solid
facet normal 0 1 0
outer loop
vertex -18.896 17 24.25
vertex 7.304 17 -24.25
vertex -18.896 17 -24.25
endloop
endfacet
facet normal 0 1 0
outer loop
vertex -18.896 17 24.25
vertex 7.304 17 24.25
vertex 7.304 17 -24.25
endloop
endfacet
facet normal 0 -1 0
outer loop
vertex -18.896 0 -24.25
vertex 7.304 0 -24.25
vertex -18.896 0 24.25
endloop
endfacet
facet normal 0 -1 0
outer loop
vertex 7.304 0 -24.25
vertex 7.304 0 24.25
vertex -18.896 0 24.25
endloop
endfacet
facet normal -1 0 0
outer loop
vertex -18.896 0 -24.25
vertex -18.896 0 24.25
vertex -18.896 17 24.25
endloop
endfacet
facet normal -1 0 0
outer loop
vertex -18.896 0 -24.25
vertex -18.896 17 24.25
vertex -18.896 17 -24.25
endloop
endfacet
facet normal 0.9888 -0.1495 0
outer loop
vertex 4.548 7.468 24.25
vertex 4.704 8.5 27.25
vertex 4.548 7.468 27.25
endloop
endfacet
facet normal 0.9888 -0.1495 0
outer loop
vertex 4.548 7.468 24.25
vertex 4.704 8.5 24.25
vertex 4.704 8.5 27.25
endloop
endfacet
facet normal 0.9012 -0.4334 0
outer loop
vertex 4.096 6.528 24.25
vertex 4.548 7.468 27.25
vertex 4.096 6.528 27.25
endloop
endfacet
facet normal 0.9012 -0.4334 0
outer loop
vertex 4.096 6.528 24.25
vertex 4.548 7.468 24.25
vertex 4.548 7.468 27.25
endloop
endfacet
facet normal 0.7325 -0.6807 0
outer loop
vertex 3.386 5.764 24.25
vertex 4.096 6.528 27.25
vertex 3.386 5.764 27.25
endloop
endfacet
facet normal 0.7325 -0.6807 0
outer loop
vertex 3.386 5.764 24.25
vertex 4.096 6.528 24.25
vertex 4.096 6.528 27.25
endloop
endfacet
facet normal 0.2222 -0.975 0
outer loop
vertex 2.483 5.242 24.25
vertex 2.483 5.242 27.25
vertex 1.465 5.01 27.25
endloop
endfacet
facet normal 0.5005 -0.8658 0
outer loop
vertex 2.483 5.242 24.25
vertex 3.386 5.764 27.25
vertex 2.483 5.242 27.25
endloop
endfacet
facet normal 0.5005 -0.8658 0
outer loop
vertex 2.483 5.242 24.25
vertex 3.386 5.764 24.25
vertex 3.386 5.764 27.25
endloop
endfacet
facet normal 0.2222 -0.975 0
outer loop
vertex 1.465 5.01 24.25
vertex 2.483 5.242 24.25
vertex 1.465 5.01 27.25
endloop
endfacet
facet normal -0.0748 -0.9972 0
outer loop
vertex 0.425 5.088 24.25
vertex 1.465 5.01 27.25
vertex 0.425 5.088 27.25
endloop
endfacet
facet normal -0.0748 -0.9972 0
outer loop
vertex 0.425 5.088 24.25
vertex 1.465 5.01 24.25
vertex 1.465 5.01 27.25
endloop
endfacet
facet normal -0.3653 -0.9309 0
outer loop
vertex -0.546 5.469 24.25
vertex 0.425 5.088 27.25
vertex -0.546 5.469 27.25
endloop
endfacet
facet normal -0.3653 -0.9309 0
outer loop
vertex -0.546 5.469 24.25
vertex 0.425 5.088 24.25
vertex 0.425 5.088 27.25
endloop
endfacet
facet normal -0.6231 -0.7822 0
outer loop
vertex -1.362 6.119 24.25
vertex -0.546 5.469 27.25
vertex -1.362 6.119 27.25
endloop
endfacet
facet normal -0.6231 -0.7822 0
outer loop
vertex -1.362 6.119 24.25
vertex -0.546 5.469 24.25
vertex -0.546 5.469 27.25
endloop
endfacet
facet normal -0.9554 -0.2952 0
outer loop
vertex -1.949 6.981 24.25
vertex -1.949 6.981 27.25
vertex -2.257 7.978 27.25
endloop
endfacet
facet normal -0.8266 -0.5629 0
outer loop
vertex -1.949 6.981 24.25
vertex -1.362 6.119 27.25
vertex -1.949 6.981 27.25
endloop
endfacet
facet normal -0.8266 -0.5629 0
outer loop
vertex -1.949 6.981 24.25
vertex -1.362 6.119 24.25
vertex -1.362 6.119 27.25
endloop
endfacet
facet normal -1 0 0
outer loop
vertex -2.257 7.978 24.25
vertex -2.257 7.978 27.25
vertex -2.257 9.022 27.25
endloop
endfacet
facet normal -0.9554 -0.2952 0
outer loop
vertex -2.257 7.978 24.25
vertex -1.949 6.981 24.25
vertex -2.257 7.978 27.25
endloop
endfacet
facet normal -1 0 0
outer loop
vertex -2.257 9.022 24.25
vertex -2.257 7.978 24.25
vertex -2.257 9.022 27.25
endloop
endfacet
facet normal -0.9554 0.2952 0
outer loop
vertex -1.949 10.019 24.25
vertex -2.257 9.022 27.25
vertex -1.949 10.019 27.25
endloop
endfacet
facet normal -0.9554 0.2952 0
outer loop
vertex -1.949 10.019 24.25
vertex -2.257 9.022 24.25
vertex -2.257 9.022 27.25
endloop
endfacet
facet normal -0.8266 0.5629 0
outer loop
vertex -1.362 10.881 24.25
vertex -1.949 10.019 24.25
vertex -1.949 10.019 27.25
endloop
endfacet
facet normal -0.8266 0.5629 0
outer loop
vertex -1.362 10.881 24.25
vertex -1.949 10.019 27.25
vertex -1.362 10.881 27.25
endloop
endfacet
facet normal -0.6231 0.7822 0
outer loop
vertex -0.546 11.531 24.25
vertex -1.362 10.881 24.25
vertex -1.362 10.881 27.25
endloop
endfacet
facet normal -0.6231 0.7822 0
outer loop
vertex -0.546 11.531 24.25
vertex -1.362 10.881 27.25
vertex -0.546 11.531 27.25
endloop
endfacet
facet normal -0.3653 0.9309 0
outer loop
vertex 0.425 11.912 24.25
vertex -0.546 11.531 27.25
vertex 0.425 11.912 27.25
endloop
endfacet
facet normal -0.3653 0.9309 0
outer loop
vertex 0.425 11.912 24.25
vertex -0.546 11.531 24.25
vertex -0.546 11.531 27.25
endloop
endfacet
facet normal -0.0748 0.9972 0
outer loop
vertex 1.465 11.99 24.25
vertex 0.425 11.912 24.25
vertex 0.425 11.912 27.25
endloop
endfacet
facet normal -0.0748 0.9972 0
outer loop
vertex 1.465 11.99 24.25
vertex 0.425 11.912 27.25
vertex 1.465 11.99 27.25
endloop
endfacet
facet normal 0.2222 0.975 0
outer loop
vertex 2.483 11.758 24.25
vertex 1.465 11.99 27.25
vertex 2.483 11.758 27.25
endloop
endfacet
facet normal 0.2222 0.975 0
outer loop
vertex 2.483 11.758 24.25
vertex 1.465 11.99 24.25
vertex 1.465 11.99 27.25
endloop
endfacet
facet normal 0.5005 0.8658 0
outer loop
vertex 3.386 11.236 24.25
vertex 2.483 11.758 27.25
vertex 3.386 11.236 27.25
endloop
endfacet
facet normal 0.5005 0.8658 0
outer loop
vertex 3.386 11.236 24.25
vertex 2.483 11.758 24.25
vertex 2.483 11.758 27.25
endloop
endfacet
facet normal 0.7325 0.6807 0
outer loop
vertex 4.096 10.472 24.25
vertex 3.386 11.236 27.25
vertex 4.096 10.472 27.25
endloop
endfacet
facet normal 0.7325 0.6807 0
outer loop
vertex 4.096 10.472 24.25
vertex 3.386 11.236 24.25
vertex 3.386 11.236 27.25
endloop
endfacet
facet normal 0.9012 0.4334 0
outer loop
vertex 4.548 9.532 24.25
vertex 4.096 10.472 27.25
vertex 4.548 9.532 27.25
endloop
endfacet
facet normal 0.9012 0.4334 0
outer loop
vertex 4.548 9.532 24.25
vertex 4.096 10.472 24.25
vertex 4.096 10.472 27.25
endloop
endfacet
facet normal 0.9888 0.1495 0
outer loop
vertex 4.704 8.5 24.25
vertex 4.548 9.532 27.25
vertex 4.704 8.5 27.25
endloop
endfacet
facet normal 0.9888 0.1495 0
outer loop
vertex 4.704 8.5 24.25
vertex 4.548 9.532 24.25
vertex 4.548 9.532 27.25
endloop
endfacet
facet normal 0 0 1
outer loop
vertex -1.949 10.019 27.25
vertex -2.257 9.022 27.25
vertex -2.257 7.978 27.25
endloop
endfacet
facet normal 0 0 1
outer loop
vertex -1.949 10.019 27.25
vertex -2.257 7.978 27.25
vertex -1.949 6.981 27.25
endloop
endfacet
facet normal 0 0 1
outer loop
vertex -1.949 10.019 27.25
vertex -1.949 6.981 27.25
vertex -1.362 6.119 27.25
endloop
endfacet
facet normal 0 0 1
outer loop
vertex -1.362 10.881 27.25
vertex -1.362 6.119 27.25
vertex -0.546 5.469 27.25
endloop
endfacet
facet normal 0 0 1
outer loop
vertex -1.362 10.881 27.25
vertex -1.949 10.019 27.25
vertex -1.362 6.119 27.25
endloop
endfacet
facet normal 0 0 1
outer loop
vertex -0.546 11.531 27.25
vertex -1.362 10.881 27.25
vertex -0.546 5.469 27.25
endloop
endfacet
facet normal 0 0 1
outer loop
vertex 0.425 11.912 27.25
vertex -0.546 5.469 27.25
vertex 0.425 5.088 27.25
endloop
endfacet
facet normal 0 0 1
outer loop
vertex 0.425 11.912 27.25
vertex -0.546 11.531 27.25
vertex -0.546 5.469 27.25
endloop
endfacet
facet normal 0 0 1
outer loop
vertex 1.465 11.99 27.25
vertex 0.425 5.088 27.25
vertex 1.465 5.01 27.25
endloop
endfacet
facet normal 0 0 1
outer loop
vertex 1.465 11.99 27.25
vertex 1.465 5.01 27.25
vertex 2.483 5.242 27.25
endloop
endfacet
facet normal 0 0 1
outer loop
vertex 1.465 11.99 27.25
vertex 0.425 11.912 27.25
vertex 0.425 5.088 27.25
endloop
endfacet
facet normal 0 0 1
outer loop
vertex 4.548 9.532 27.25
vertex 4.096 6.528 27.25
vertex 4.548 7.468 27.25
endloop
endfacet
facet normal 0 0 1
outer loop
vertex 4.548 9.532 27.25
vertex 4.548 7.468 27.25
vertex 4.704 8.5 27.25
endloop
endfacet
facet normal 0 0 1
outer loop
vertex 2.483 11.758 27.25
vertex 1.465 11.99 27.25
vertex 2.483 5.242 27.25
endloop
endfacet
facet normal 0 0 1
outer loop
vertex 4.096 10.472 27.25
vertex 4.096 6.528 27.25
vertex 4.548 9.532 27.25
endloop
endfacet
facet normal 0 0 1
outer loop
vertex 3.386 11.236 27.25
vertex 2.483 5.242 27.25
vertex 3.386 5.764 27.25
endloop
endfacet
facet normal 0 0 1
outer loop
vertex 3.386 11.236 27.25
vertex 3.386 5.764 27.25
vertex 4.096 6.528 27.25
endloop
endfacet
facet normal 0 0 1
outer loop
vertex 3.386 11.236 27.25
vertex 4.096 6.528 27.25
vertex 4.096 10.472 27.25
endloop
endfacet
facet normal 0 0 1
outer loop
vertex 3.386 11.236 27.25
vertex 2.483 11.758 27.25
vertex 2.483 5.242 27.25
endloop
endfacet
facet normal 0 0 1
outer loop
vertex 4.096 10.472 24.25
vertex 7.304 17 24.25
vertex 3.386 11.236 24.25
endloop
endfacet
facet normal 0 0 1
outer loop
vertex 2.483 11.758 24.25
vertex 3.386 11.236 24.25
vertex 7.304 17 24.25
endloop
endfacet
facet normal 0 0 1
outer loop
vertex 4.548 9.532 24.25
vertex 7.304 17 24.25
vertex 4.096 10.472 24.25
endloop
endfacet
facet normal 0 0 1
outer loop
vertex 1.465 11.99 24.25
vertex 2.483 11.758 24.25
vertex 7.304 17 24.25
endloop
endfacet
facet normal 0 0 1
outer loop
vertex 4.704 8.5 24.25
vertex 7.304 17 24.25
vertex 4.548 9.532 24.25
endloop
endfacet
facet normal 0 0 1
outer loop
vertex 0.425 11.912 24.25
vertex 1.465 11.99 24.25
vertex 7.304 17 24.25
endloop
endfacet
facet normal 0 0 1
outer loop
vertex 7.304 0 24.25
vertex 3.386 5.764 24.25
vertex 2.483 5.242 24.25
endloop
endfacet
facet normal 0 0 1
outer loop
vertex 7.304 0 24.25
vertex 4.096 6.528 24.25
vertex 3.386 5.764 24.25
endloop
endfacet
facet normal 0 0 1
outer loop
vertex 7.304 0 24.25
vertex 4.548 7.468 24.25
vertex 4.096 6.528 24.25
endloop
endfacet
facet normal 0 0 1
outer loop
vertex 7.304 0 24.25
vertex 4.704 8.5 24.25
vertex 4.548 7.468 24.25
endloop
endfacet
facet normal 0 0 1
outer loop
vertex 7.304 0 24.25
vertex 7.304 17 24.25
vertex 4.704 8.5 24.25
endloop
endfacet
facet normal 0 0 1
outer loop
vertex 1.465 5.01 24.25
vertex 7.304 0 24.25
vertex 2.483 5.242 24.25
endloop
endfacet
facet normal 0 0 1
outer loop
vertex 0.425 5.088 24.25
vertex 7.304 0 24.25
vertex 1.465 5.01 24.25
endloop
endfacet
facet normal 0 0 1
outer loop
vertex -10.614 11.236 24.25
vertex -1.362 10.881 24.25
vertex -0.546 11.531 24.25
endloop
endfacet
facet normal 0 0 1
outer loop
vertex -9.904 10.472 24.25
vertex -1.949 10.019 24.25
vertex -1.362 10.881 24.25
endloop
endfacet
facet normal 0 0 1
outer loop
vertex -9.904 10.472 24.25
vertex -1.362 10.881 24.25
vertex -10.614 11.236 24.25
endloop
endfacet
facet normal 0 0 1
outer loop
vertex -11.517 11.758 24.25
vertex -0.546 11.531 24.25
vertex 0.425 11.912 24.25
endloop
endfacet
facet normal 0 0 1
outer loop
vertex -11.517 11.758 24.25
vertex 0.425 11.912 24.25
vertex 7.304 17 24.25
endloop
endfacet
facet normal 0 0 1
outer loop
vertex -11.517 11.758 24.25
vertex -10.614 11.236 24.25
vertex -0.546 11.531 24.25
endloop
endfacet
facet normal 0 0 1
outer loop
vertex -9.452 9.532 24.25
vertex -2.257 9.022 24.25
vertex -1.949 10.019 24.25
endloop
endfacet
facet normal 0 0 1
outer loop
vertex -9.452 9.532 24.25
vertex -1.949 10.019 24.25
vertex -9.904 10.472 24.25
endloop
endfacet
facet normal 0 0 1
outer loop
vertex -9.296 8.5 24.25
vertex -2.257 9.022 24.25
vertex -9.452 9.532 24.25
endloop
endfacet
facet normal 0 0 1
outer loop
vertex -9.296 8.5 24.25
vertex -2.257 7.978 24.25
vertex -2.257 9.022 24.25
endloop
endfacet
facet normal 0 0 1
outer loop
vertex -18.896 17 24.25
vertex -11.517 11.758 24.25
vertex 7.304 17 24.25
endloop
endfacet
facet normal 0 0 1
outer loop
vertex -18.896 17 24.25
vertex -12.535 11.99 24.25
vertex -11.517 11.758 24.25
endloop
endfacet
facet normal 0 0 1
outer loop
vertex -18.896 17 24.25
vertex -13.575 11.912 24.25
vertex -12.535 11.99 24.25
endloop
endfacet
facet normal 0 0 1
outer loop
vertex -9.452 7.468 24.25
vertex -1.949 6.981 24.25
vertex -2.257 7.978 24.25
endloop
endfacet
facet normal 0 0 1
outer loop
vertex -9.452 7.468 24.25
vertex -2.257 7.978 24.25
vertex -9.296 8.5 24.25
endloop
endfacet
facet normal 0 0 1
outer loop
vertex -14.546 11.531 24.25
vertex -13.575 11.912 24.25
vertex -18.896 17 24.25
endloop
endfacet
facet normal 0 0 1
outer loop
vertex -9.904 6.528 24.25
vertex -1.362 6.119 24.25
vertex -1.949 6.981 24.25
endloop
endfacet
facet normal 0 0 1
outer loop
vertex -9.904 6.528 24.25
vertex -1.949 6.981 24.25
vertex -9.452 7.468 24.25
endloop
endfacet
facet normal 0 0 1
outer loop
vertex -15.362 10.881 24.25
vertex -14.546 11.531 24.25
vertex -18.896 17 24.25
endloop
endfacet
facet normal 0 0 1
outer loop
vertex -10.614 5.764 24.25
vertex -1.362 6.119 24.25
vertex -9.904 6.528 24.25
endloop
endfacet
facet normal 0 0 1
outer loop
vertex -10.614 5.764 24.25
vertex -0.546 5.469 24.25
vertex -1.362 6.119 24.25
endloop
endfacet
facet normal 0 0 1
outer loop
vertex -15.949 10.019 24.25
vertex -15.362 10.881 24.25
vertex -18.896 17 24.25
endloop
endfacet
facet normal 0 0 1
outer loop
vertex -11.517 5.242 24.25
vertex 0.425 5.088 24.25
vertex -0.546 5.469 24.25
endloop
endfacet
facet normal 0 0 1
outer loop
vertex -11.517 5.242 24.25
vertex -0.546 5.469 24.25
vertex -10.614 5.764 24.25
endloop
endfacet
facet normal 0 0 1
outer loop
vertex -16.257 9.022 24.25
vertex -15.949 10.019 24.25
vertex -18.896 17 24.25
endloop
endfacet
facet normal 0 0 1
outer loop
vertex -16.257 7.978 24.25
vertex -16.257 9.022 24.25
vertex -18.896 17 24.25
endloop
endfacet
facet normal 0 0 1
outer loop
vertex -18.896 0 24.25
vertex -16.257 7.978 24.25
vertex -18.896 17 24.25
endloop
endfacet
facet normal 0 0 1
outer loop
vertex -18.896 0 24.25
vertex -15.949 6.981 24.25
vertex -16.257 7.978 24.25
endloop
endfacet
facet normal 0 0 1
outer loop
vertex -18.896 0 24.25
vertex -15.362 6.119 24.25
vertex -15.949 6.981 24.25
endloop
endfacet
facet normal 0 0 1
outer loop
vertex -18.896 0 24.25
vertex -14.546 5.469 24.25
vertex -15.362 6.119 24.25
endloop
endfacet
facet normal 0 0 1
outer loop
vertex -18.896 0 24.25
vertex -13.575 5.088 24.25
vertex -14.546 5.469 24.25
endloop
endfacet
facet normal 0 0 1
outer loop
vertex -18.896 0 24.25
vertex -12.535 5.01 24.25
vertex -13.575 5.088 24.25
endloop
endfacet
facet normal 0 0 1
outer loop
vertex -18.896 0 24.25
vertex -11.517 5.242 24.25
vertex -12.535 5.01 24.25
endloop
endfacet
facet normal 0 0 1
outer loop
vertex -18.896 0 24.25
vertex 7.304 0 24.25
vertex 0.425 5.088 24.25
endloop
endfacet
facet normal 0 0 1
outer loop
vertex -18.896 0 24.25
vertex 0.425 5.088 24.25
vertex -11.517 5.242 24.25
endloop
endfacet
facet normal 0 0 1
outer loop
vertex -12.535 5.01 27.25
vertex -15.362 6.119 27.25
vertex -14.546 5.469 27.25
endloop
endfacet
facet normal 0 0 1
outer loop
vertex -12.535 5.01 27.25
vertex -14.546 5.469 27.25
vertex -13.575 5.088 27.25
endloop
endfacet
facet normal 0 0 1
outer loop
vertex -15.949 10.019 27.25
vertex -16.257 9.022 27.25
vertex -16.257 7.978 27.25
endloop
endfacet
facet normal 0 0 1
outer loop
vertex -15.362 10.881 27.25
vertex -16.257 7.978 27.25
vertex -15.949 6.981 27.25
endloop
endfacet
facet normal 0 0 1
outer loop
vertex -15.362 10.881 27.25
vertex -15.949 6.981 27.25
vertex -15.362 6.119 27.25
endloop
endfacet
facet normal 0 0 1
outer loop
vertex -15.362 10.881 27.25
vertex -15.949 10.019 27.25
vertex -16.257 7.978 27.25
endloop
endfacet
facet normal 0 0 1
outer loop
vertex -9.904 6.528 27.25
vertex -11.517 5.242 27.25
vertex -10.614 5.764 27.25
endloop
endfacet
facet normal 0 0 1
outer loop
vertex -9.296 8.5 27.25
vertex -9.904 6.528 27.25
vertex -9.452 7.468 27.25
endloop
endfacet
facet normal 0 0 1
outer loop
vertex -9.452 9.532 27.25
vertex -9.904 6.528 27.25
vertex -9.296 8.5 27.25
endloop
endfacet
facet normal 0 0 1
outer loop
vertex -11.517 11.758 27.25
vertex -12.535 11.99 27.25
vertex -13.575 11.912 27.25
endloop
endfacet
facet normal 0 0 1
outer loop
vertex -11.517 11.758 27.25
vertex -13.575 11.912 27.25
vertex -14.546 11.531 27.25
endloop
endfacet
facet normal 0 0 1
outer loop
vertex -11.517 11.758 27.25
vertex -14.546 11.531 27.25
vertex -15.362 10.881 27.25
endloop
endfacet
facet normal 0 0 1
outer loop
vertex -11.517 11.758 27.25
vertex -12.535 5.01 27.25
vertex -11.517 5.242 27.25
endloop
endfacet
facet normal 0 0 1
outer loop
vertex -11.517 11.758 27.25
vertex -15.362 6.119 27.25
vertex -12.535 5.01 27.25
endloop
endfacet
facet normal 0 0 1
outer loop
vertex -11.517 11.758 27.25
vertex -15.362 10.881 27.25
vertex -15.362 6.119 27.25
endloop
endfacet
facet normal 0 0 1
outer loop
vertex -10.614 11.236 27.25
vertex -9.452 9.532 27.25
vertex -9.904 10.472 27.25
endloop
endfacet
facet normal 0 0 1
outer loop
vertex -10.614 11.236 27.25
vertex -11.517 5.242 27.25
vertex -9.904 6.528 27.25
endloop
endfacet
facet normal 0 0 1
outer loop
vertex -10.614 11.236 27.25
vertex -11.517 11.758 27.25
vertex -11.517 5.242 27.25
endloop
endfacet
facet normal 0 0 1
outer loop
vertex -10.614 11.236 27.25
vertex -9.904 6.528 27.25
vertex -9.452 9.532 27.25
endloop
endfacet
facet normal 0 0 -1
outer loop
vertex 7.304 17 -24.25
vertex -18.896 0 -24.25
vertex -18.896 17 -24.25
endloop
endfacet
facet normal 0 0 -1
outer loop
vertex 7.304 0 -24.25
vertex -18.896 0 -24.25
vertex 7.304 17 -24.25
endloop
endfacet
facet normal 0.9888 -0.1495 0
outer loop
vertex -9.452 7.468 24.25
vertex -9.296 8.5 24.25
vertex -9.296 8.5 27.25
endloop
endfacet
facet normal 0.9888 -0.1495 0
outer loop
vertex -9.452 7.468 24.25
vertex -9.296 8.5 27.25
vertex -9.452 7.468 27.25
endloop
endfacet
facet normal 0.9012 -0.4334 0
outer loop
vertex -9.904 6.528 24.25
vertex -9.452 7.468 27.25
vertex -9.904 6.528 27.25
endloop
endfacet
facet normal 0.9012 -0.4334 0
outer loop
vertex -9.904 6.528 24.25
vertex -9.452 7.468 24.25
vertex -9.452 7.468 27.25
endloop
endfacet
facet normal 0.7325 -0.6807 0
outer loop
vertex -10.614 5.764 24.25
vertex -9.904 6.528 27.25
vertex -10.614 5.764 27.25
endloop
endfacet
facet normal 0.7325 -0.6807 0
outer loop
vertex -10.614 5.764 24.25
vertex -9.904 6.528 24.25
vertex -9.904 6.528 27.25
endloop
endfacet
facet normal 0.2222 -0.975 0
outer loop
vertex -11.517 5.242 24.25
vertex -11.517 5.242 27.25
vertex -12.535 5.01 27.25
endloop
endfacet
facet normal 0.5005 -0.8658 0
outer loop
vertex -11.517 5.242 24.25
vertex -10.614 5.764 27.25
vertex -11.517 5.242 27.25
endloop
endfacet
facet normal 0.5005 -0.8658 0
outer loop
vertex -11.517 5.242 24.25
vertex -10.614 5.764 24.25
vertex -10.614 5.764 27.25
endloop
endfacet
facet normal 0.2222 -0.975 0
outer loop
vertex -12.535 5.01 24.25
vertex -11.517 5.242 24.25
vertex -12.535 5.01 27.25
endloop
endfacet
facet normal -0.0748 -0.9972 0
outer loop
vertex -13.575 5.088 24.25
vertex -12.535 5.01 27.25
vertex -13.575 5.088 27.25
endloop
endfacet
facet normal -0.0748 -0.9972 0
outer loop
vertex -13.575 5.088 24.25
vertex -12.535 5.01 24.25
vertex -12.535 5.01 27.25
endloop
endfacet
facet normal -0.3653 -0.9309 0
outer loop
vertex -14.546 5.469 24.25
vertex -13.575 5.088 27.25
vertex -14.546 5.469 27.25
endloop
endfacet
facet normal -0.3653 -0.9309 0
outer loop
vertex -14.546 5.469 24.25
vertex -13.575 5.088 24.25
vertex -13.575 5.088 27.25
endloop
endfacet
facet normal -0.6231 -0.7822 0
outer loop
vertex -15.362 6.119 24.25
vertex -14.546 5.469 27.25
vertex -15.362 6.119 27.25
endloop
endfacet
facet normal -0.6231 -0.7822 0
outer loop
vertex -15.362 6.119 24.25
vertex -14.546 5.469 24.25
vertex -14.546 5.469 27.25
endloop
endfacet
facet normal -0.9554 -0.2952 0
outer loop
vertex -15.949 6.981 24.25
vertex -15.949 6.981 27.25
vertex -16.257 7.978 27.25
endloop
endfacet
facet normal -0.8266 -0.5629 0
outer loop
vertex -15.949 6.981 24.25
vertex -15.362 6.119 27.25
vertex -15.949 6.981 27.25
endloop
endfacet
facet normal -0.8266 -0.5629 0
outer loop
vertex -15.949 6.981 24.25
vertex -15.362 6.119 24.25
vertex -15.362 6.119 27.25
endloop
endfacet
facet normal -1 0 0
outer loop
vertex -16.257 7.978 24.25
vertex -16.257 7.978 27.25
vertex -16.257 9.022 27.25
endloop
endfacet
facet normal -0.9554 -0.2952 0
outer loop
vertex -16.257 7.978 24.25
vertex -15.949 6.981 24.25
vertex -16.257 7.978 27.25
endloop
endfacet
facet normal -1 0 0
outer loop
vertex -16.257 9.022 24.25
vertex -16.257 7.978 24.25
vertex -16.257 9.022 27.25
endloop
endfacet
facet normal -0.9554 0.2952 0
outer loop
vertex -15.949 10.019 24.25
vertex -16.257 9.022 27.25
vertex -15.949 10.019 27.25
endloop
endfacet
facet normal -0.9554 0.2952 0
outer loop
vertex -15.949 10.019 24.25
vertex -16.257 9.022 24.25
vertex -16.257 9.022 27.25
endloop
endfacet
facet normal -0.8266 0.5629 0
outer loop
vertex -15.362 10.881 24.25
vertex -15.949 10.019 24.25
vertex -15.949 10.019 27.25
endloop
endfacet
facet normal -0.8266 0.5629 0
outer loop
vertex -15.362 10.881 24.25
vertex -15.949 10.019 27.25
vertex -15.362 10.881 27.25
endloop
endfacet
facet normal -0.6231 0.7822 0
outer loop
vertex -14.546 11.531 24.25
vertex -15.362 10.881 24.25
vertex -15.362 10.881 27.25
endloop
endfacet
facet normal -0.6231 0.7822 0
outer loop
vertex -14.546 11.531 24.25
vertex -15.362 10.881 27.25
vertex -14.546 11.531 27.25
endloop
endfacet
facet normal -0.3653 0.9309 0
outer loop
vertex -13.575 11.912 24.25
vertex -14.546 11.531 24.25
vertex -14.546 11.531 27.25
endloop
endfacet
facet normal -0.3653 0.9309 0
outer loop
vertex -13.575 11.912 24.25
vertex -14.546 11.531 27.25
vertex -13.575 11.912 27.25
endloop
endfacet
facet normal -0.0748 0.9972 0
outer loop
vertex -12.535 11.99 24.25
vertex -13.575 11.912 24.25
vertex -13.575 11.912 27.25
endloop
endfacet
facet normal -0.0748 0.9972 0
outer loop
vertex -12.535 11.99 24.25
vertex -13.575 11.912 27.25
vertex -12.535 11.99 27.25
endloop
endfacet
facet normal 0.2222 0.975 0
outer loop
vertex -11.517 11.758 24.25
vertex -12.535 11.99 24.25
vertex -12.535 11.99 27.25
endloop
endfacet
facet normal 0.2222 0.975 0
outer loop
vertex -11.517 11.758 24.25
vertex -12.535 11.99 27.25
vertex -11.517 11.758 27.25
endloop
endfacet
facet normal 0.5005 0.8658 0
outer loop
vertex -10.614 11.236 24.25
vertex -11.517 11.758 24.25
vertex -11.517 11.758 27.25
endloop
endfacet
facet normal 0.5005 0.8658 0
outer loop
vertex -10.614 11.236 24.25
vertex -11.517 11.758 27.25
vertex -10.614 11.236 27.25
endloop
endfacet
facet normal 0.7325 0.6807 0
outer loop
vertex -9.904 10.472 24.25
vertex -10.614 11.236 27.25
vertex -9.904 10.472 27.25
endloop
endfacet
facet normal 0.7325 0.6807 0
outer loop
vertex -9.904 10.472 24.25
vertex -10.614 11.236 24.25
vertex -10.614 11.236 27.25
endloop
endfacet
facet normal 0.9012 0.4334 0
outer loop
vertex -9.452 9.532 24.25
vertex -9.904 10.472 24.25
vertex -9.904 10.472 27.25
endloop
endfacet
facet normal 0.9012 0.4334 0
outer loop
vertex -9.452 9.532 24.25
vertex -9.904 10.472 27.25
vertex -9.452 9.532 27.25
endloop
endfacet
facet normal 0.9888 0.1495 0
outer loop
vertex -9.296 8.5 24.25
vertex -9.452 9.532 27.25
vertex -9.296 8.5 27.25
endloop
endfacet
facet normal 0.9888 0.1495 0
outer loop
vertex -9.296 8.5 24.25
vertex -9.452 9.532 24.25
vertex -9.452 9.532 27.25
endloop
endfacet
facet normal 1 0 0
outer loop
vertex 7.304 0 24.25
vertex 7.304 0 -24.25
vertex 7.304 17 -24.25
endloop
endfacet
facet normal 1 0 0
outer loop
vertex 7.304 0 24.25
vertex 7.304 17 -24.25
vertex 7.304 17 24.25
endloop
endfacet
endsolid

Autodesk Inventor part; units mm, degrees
ref_plane "YZ Plane" through (0, 0, 0) normal (1, 0, 0) x (0, 1, 0)
ref_plane "XZ Plane" through (0, 0, 0) normal (0, 1, 0) x (-1, 0, 0)
ref_plane "XY Plane" through (0, 0, 0) normal (0, 0, 1) x (1, 0, 0)
sketch "Skizze1" plane through (0, 0, 0) normal (0, 1, 0) x (-1, 0, 0)
  line L0 (24.1361, 0) -> (-12.5439, 0) projected
  line L1 (0, -33.95) -> (0, 33.95) projected
  line L2 (-7.3039, 24.25) -> (18.8961, 24.25)
  line L3 (18.8961, 24.25) -> (18.8961, -24.25)
  line L4 (18.8961, -24.25) -> (-7.3039, -24.25)
  line L5 (-7.3039, -24.25) -> (-7.3039, 24.25)
  point P0 (0, 0)
  dimension "d0" = 48.5
  dimension "d1" = 26.2
extrude "Extrusion1" add sketch "Skizze1" along normal blind 17
sketch "Skizze3" plane through (-18.8961, 0, 24.25) normal (0, 0, 1) x (1, 0, 0)
  line L0 (26.2, 0) -> (0, 0) projected
  line L1 (0, 0) -> (0, 17) projected
  line L2 (0, 17) -> (26.2, 17) projected
  line L3 (13.1, 17) -> (13.1, 0)
  circle A0 centre (6.1, 8.5) radius 3.5
  circle A1 centre (20.1, 8.5) radius 3.5
  point P0 (18.8961, 0)
  dimension "d7" = 13.1
  dimension "d8" = 7
  dimension "d9" = 8.5
  dimension "d10" = 7
extrude "Extrusion2" add sketch "Skizze3" along normal blind 3 contours A0 | A1
equation "\"d10\" = usedParameter"
equation "\"usedParameter\" = 7"
equation "\"unusedParameter\" = 42"
properties part number "9VBatterie_2017only" material "Edelstahl"
